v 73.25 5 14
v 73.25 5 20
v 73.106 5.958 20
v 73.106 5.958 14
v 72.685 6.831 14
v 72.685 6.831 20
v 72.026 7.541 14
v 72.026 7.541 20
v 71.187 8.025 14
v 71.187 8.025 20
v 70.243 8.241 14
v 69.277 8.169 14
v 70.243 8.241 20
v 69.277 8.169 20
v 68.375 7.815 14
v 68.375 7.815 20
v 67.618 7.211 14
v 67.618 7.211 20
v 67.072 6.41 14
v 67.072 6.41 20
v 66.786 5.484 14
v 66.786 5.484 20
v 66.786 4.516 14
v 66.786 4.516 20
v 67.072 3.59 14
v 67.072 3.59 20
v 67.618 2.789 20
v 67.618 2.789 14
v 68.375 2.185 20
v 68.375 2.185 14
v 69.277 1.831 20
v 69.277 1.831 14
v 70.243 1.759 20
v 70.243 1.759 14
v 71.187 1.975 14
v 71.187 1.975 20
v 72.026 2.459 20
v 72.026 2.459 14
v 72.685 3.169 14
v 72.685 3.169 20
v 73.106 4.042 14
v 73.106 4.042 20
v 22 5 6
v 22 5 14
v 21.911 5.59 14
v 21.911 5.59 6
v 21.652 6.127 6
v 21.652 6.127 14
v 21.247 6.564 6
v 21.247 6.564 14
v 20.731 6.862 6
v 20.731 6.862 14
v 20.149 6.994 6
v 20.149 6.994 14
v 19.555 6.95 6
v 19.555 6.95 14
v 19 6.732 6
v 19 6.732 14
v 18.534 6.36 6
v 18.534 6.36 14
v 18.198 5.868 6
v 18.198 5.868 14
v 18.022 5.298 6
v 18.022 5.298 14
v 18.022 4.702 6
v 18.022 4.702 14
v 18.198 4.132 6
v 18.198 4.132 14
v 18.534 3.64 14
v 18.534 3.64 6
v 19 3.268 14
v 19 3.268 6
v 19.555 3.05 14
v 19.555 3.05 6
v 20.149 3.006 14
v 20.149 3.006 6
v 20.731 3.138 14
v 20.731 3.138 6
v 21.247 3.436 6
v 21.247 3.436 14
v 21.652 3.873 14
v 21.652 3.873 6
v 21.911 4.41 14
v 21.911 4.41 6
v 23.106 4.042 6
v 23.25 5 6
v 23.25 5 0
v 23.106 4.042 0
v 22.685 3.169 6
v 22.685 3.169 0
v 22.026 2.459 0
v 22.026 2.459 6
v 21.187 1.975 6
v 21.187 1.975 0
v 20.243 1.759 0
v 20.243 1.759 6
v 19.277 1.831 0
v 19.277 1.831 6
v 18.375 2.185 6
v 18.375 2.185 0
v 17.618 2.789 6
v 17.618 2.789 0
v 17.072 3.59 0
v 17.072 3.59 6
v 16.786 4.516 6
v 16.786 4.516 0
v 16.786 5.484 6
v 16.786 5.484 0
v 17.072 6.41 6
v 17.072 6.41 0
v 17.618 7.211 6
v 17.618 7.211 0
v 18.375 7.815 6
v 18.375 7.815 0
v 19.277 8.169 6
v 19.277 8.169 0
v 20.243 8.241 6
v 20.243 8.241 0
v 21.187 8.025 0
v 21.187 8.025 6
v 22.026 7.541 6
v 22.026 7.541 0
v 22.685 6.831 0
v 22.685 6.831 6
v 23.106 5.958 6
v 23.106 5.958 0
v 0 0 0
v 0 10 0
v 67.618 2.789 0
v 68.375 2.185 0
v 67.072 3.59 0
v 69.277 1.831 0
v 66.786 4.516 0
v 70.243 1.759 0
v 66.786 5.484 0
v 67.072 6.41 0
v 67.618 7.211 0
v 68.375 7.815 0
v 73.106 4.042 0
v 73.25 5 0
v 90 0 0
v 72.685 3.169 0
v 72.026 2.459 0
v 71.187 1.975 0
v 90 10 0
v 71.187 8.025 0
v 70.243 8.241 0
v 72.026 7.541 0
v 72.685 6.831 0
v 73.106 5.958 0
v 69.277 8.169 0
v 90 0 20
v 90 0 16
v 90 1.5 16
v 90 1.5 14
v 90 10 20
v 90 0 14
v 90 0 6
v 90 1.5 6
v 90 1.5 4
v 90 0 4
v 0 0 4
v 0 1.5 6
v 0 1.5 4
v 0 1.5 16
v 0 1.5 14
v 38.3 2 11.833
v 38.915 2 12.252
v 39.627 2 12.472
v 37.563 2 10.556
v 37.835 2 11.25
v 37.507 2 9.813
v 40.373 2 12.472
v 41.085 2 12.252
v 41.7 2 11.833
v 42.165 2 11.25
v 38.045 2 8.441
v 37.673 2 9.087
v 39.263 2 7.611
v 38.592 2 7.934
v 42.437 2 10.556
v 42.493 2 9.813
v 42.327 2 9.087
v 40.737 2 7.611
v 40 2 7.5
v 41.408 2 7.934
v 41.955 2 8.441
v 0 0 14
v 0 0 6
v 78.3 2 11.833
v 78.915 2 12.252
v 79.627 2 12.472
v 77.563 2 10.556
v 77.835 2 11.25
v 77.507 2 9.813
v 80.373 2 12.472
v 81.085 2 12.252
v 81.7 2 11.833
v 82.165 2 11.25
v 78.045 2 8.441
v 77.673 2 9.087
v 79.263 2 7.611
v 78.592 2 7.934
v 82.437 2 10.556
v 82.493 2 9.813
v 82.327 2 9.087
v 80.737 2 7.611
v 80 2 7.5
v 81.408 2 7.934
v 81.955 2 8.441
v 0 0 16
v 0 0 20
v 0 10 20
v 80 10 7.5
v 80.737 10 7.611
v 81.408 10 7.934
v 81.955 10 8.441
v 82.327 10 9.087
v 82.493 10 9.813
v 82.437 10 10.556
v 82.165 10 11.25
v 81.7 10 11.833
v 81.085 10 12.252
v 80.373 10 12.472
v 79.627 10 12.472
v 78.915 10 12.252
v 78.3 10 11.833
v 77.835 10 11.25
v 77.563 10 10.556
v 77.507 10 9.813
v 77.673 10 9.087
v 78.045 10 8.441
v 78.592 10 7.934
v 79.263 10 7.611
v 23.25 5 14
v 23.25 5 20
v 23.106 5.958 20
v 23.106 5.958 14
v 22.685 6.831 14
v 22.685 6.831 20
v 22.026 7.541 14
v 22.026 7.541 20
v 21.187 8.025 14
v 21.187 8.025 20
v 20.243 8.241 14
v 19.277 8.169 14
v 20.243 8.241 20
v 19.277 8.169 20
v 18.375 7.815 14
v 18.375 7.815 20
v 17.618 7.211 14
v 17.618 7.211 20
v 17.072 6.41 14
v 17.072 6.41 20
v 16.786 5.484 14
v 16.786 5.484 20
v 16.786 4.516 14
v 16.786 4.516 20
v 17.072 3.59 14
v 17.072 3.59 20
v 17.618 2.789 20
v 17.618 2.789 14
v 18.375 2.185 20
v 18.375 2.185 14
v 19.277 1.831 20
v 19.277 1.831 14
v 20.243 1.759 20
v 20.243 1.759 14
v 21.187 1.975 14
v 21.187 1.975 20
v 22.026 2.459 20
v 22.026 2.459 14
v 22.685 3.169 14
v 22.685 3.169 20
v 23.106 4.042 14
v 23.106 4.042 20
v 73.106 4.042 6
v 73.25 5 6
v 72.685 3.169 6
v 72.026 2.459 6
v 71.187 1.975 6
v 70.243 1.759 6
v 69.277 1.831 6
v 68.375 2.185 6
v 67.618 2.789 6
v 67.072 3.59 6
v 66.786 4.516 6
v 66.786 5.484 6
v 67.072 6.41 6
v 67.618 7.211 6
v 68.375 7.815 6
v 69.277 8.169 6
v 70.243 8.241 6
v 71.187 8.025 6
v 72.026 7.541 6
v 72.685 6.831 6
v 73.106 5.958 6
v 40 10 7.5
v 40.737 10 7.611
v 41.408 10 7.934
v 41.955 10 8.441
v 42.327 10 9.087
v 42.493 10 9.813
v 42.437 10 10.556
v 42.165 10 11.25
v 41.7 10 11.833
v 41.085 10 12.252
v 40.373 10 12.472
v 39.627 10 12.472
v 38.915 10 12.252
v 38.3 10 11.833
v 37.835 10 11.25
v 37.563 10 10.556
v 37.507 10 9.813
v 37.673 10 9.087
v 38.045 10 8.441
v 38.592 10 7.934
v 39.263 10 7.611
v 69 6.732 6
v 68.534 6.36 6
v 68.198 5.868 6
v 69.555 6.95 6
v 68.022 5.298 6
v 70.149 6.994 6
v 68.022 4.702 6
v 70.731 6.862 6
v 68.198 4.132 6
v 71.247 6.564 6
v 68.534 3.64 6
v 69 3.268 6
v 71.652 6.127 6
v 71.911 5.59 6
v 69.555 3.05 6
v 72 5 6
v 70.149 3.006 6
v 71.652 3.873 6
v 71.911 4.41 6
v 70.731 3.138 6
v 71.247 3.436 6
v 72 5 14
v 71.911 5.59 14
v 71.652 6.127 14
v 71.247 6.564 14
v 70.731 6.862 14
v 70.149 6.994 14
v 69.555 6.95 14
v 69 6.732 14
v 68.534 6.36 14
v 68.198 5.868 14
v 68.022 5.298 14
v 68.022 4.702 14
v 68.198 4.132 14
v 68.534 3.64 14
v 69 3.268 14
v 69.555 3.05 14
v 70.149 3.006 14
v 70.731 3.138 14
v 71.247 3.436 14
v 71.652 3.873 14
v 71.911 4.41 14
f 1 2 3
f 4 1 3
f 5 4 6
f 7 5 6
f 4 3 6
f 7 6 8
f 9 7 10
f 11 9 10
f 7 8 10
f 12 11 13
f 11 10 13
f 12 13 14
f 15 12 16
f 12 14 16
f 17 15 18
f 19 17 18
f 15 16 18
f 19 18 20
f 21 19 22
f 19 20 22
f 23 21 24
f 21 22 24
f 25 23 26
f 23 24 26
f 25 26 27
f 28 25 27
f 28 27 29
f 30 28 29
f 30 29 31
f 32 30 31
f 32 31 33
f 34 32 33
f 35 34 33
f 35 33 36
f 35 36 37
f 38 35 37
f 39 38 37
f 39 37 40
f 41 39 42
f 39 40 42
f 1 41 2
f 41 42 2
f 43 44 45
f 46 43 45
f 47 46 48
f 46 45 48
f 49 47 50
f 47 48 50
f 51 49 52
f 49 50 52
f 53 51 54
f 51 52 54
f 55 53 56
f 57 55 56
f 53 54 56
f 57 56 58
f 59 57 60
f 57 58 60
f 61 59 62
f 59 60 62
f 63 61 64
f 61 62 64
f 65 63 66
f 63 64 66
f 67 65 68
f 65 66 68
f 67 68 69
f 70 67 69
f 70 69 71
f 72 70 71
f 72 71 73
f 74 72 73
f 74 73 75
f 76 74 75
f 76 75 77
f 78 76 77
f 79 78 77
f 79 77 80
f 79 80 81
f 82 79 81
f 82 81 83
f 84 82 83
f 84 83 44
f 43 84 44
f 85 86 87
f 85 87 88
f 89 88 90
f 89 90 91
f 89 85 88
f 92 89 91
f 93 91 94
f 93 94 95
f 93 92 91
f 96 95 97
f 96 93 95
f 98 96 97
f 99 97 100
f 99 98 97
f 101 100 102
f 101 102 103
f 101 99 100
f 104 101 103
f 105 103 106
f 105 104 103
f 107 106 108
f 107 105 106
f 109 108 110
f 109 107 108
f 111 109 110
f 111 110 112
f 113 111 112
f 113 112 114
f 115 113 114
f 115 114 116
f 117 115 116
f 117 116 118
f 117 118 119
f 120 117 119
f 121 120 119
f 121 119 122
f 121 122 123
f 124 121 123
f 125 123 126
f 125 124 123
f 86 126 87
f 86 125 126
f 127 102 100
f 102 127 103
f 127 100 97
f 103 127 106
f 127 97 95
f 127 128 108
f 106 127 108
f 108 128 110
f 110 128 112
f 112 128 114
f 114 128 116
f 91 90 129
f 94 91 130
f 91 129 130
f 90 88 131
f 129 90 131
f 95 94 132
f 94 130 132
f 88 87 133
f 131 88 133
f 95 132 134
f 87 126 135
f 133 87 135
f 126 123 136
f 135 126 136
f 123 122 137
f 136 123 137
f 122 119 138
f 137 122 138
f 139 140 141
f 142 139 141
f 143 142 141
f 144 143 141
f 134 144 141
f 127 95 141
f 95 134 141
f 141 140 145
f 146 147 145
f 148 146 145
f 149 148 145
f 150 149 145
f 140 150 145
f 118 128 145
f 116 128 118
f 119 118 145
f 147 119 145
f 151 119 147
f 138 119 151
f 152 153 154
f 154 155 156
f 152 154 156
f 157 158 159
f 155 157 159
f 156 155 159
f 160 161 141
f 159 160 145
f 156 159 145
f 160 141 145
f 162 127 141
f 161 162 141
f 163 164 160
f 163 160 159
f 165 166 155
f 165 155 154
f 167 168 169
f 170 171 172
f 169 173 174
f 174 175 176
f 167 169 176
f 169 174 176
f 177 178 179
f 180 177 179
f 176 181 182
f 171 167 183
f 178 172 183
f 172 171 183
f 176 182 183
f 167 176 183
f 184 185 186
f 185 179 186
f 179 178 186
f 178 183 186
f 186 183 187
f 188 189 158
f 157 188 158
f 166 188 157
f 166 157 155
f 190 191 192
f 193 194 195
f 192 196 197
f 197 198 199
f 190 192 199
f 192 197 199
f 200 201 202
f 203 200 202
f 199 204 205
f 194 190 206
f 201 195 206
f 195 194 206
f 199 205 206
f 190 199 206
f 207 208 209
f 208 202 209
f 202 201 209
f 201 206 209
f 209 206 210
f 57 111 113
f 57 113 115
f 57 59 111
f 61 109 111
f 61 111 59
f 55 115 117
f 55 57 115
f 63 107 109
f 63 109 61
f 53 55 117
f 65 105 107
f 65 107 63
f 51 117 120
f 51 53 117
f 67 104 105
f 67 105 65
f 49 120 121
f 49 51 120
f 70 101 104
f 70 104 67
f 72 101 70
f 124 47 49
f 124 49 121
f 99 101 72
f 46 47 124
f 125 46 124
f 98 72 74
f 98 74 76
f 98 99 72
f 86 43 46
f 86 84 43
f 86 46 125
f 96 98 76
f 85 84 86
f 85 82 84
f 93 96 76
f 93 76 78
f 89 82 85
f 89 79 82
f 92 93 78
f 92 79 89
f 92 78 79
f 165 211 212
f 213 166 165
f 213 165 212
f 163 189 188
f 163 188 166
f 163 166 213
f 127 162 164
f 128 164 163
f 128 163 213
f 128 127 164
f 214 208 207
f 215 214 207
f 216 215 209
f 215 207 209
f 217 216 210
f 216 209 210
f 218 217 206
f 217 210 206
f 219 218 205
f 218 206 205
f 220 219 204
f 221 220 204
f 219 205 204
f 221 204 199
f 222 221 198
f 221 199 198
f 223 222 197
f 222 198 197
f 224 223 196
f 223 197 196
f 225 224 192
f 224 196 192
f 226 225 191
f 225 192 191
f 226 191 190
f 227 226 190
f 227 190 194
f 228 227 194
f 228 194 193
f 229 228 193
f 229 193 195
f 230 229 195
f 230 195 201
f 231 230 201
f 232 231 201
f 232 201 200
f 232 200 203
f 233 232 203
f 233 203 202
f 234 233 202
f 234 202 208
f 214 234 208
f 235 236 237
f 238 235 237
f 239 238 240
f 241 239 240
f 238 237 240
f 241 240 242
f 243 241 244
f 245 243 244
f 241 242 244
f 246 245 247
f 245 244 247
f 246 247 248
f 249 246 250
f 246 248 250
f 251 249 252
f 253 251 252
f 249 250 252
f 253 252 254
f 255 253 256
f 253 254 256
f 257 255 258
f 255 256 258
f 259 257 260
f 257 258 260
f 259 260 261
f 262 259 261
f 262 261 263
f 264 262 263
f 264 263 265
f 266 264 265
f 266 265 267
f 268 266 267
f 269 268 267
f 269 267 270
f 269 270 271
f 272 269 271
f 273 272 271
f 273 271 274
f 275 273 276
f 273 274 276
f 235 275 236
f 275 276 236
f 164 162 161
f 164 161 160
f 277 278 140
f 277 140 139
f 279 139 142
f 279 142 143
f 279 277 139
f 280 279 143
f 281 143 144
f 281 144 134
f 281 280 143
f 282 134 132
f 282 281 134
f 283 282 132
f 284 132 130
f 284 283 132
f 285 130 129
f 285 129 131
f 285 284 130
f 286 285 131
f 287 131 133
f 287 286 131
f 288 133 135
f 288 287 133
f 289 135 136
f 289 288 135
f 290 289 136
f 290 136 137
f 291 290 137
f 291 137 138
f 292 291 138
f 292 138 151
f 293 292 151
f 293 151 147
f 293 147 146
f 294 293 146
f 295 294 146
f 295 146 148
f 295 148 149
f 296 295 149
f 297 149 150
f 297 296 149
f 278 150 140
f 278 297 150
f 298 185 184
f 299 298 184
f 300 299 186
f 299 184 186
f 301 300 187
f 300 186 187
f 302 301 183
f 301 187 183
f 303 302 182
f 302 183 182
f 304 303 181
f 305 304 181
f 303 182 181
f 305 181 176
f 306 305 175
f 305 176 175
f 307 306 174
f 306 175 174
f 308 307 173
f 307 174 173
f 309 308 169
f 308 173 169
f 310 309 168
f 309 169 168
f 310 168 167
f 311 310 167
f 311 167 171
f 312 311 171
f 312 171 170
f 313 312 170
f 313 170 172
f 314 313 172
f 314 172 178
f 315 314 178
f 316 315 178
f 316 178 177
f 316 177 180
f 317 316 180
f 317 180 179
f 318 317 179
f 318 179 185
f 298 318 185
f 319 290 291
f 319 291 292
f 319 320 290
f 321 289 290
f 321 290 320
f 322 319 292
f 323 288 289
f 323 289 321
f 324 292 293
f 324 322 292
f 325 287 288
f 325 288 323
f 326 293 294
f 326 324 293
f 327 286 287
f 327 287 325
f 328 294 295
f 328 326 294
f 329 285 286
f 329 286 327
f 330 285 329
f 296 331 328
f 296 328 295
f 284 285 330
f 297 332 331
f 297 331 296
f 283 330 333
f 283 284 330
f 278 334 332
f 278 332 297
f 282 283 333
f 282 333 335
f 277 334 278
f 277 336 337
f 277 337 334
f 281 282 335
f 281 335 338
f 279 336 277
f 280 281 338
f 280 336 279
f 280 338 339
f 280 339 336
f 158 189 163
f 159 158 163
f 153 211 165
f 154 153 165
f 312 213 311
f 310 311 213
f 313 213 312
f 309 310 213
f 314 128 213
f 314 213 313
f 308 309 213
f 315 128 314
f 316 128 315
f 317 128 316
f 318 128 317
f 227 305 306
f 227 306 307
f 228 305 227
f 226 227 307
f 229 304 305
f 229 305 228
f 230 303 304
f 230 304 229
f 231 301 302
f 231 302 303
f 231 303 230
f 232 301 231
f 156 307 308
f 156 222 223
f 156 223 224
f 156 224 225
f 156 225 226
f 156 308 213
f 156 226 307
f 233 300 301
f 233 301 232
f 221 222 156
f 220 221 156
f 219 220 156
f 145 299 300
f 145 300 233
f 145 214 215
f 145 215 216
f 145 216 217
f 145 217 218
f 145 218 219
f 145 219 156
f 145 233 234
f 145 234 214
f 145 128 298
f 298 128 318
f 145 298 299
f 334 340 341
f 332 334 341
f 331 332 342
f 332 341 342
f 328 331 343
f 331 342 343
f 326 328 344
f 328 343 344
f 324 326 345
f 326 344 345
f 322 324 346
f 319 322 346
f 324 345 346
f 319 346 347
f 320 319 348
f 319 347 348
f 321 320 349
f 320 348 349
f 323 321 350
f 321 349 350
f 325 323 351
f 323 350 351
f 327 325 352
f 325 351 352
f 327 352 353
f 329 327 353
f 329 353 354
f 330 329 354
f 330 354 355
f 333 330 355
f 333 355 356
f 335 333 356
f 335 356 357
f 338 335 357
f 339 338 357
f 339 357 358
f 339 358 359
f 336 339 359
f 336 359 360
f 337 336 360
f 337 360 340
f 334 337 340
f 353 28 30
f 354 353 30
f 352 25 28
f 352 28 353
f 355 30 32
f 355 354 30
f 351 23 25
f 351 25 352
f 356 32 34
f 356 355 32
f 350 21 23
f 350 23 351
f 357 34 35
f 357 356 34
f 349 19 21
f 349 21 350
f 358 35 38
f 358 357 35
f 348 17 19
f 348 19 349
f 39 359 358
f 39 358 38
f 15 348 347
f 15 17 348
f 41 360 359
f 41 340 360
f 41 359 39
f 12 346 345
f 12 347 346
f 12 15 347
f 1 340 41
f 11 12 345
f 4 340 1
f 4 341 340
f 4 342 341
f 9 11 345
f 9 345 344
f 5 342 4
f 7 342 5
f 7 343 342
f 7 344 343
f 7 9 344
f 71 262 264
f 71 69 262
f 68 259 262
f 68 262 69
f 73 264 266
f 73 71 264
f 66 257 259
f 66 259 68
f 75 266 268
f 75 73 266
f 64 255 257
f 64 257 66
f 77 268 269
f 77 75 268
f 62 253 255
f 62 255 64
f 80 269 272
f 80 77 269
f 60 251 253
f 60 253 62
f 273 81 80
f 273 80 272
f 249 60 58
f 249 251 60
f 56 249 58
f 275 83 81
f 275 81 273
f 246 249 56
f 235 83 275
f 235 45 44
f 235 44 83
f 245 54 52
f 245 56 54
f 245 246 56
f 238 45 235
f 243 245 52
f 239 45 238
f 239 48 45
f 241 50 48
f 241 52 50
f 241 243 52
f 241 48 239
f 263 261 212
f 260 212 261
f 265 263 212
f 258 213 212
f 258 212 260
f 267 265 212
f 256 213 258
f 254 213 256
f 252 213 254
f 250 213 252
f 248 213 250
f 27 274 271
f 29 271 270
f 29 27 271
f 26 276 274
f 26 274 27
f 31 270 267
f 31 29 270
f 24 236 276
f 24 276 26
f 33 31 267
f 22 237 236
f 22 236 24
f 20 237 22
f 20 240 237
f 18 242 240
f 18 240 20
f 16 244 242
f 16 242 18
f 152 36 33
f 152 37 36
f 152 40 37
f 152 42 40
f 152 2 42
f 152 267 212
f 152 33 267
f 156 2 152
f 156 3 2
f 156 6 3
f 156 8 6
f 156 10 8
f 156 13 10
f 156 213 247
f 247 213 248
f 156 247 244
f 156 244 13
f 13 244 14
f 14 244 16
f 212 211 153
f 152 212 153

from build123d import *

# Parameters (mm, degrees)
IZIM1_W                          = 90
IZIM1_H                          = 10
Y_KSEKLIK_EKSTR_ZYON1_DEPTH      = 20
IZIM6_W                          = 2
IZIM6_H                          = 1.5
KES_EKSTR_ZYON1_DEPTH            = 93.736184955
F_4_0MM_SAPLAMA_DELIKLERI3_D     = 5
F_4_0MM_SAPLAMA_DELIKLERI3_DEPTH = 8
IZIM14_R                         = 2
KES_EKSTR_ZYON2_DEPTH            = 93.736184955
IZIM13_R                         = 3.25
KES_EKSTR_ZYON4_DEPTH            = 6
KES_EKSTR_ZYON5_START            = -6
IZIM15_R                         = 3.25
KES_EKSTR_ZYON5_DEPTH            = 6


with BuildPart() as part:
    # Çizim1 → Yükseklik-Ekstrüzyon1 (new body)
    with BuildSketch(Plane.XY):
        with Locations((45, 5)):
            Rectangle(IZIM1_W, IZIM1_H)
    extrude(amount=Y_KSEKLIK_EKSTR_ZYON1_DEPTH)

    # Çizim6 → Kes-Ekstrüzyon1 (cut, through all)
    with BuildSketch(Plane.ZY):
        with Locations((5, 0.75)):
            Rectangle(IZIM6_W, IZIM6_H)
        with Locations((15, 0.75)):
            Rectangle(IZIM6_W, IZIM6_H)
    extrude(amount=-KES_EKSTR_ZYON1_DEPTH, mode=Mode.SUBTRACT)

    # Ø4.0mm Saplama Delikleri3
    with Locations(Plane(origin=(40, 10, 10), x_dir=(0, 0, 1), z_dir=(0, 1, 0))):
        with Locations((0, 0), (0, 40)):
            Hole(F_4_0MM_SAPLAMA_DELIKLERI3_D / 2, depth=F_4_0MM_SAPLAMA_DELIKLERI3_DEPTH)

    # Çizim14 → Kes-Ekstrüzyon2 (cut, through all)
    with BuildSketch(Plane.XY.offset(20)):
        with Locations((20, 5)):
            Circle(IZIM14_R)
        with Locations((70, 5)):
            Circle(IZIM14_R)
    extrude(amount=-KES_EKSTR_ZYON2_DEPTH, mode=Mode.SUBTRACT)

    # Çizim13 → Kes-Ekstrüzyon4 (cut)
    with BuildSketch(Plane.XY.offset(20)):
        with Locations((20, 5)):
            Circle(IZIM13_R)
        with Locations((70, 5)):
            Circle(IZIM13_R)
    extrude(amount=-KES_EKSTR_ZYON4_DEPTH, mode=Mode.SUBTRACT)

    # Çizim15 → Kes-Ekstrüzyon5 (cut)
    with BuildSketch(Plane(origin=(0, 0, 0), x_dir=(-1, 0, 0), z_dir=(0, 0, -1)).offset(KES_EKSTR_ZYON5_START)):
        with Locations(Location((-70, 5, 0), (0, 0, 180))):
            Circle(IZIM15_R)
        with Locations(Location((-20, 5, 0), (0, 0, 180))):
            Circle(IZIM15_R)
    extrude(amount=KES_EKSTR_ZYON5_DEPTH, mode=Mode.SUBTRACT)


solid = part.part
